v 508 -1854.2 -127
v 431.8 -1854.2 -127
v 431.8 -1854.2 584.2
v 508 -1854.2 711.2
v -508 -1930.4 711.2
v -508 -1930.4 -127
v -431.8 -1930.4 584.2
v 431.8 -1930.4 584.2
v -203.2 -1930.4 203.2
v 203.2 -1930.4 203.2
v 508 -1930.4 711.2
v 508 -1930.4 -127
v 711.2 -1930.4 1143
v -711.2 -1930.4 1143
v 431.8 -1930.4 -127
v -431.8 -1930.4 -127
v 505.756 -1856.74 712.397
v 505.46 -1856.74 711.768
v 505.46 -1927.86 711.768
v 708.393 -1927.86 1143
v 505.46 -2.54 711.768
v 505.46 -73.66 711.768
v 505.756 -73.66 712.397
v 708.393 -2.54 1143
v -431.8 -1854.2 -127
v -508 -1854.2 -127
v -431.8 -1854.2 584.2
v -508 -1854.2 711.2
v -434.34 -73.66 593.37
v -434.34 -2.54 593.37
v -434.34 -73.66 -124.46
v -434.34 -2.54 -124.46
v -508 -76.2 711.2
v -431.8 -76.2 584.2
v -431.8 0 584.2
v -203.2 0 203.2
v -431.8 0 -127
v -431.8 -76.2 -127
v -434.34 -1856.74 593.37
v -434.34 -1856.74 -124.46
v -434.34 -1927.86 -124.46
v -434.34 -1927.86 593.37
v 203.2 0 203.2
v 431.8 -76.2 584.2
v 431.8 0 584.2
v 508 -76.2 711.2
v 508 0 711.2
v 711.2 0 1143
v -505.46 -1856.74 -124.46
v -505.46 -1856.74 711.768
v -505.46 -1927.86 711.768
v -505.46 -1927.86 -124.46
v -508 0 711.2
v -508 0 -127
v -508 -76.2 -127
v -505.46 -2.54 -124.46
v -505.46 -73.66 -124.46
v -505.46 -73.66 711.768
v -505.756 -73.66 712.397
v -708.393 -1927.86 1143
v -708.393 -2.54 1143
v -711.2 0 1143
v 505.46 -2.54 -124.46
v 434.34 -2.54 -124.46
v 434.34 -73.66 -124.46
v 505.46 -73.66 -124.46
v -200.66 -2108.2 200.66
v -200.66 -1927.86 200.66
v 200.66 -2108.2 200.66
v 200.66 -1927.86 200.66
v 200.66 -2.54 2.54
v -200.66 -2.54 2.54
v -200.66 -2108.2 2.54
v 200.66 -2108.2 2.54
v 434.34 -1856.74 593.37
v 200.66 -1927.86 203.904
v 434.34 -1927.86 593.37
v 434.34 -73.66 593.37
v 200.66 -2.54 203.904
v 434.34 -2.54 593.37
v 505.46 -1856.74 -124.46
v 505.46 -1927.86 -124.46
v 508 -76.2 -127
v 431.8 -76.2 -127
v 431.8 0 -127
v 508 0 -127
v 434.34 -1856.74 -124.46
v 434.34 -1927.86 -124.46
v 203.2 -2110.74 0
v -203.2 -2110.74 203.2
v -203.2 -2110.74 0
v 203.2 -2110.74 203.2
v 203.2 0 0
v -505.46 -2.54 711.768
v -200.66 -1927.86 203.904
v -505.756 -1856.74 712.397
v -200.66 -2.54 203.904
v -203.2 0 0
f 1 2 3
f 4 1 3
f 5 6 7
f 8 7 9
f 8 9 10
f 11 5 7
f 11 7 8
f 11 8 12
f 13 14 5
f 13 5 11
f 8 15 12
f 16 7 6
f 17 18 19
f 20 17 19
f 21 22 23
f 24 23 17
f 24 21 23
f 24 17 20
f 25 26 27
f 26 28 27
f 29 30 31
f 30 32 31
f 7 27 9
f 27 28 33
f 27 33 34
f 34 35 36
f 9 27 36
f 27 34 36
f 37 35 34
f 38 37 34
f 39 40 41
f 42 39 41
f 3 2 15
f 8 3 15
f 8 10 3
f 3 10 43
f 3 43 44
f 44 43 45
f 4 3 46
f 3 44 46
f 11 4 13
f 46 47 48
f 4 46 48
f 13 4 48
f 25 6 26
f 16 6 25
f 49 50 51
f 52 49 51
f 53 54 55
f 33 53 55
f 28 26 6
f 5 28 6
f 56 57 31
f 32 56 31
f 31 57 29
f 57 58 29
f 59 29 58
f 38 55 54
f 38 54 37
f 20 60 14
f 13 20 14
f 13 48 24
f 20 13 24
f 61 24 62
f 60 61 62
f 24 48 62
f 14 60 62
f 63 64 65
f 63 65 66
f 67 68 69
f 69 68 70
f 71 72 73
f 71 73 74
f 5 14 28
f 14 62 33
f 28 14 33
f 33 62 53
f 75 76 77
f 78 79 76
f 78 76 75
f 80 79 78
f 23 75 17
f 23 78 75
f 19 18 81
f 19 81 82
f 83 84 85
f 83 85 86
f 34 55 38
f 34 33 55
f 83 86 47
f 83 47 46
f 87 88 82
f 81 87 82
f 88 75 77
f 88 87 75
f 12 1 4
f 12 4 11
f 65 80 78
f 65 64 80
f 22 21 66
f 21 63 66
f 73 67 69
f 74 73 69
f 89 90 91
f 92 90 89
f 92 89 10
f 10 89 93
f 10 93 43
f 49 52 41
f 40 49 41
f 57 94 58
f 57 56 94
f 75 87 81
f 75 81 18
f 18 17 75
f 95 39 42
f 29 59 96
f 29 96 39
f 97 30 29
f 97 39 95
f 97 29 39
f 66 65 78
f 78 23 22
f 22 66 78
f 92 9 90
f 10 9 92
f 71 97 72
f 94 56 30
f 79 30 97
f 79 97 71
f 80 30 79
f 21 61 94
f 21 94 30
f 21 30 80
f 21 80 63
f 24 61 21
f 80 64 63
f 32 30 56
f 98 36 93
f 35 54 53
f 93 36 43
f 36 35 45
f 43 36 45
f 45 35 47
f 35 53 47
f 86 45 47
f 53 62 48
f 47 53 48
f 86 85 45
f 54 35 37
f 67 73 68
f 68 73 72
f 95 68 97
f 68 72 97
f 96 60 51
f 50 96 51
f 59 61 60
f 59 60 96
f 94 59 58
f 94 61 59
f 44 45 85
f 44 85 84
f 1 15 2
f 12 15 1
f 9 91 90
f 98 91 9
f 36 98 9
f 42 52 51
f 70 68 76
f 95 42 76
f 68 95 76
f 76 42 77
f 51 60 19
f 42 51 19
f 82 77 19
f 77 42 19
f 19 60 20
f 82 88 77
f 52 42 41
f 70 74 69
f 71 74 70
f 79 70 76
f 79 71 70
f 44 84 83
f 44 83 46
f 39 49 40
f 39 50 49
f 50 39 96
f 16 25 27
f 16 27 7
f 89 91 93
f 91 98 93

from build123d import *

# Parameters (mm, degrees)
F1_DEPTH = 1930.4
F3_W     = 76.2
F3_H     = 76.2
F5_W     = 406.4
F5_H     = 203.2
F6_DEPTH = 180.34
F7_T     = -2.54


with BuildPart() as f1:
    # F0 (on Front) → F1 (new body)
    with BuildSketch(Plane.XZ):
        Polygon((-203.2, 0), (0, 0), (203.2, 0), (203.2, 203.2), (508, 711.2), (711.2, 1143), (0, 1143), (-711.2, 1143), (-508, 711.2), (-203.2, 203.2), align=None)
    extrude(amount=F1_DEPTH)

    # F3 (on offset) → F4 (join, up to the next surface of F1)
    with BuildSketch(Plane(origin=(0, 0, -127), x_dir=(1, 0, 0), z_dir=(0, 0, -1))):
        with Locations((-469.9, 1892.3)):
            Rectangle(F3_W, F3_H)
        with Locations((469.9, 1892.3)):
            Rectangle(F3_W, F3_H)
        with Locations((469.9, 38.1)):
            Rectangle(F3_W, F3_H)
        with Locations((-469.9, 38.1)):
            Rectangle(F3_W, F3_H)
    extrude(until=Until.NEXT, dir=(0, 0, 1))

    # F5 (on face) → F6 (join)
    with BuildSketch(Plane.XZ.offset(1930.4)):
        with Locations((0, 101.6)):
            Rectangle(F5_W, F5_H)
    extrude(amount=F6_DEPTH)

    # F7
    f7_openings = [f1.faces().sort_by_distance(p)[0] for p in [
        (0, -965.2, 1143),
    ]]
    offset(amount=F7_T, openings=f7_openings, kind=Kind.INTERSECTION)


solid = f1.part
